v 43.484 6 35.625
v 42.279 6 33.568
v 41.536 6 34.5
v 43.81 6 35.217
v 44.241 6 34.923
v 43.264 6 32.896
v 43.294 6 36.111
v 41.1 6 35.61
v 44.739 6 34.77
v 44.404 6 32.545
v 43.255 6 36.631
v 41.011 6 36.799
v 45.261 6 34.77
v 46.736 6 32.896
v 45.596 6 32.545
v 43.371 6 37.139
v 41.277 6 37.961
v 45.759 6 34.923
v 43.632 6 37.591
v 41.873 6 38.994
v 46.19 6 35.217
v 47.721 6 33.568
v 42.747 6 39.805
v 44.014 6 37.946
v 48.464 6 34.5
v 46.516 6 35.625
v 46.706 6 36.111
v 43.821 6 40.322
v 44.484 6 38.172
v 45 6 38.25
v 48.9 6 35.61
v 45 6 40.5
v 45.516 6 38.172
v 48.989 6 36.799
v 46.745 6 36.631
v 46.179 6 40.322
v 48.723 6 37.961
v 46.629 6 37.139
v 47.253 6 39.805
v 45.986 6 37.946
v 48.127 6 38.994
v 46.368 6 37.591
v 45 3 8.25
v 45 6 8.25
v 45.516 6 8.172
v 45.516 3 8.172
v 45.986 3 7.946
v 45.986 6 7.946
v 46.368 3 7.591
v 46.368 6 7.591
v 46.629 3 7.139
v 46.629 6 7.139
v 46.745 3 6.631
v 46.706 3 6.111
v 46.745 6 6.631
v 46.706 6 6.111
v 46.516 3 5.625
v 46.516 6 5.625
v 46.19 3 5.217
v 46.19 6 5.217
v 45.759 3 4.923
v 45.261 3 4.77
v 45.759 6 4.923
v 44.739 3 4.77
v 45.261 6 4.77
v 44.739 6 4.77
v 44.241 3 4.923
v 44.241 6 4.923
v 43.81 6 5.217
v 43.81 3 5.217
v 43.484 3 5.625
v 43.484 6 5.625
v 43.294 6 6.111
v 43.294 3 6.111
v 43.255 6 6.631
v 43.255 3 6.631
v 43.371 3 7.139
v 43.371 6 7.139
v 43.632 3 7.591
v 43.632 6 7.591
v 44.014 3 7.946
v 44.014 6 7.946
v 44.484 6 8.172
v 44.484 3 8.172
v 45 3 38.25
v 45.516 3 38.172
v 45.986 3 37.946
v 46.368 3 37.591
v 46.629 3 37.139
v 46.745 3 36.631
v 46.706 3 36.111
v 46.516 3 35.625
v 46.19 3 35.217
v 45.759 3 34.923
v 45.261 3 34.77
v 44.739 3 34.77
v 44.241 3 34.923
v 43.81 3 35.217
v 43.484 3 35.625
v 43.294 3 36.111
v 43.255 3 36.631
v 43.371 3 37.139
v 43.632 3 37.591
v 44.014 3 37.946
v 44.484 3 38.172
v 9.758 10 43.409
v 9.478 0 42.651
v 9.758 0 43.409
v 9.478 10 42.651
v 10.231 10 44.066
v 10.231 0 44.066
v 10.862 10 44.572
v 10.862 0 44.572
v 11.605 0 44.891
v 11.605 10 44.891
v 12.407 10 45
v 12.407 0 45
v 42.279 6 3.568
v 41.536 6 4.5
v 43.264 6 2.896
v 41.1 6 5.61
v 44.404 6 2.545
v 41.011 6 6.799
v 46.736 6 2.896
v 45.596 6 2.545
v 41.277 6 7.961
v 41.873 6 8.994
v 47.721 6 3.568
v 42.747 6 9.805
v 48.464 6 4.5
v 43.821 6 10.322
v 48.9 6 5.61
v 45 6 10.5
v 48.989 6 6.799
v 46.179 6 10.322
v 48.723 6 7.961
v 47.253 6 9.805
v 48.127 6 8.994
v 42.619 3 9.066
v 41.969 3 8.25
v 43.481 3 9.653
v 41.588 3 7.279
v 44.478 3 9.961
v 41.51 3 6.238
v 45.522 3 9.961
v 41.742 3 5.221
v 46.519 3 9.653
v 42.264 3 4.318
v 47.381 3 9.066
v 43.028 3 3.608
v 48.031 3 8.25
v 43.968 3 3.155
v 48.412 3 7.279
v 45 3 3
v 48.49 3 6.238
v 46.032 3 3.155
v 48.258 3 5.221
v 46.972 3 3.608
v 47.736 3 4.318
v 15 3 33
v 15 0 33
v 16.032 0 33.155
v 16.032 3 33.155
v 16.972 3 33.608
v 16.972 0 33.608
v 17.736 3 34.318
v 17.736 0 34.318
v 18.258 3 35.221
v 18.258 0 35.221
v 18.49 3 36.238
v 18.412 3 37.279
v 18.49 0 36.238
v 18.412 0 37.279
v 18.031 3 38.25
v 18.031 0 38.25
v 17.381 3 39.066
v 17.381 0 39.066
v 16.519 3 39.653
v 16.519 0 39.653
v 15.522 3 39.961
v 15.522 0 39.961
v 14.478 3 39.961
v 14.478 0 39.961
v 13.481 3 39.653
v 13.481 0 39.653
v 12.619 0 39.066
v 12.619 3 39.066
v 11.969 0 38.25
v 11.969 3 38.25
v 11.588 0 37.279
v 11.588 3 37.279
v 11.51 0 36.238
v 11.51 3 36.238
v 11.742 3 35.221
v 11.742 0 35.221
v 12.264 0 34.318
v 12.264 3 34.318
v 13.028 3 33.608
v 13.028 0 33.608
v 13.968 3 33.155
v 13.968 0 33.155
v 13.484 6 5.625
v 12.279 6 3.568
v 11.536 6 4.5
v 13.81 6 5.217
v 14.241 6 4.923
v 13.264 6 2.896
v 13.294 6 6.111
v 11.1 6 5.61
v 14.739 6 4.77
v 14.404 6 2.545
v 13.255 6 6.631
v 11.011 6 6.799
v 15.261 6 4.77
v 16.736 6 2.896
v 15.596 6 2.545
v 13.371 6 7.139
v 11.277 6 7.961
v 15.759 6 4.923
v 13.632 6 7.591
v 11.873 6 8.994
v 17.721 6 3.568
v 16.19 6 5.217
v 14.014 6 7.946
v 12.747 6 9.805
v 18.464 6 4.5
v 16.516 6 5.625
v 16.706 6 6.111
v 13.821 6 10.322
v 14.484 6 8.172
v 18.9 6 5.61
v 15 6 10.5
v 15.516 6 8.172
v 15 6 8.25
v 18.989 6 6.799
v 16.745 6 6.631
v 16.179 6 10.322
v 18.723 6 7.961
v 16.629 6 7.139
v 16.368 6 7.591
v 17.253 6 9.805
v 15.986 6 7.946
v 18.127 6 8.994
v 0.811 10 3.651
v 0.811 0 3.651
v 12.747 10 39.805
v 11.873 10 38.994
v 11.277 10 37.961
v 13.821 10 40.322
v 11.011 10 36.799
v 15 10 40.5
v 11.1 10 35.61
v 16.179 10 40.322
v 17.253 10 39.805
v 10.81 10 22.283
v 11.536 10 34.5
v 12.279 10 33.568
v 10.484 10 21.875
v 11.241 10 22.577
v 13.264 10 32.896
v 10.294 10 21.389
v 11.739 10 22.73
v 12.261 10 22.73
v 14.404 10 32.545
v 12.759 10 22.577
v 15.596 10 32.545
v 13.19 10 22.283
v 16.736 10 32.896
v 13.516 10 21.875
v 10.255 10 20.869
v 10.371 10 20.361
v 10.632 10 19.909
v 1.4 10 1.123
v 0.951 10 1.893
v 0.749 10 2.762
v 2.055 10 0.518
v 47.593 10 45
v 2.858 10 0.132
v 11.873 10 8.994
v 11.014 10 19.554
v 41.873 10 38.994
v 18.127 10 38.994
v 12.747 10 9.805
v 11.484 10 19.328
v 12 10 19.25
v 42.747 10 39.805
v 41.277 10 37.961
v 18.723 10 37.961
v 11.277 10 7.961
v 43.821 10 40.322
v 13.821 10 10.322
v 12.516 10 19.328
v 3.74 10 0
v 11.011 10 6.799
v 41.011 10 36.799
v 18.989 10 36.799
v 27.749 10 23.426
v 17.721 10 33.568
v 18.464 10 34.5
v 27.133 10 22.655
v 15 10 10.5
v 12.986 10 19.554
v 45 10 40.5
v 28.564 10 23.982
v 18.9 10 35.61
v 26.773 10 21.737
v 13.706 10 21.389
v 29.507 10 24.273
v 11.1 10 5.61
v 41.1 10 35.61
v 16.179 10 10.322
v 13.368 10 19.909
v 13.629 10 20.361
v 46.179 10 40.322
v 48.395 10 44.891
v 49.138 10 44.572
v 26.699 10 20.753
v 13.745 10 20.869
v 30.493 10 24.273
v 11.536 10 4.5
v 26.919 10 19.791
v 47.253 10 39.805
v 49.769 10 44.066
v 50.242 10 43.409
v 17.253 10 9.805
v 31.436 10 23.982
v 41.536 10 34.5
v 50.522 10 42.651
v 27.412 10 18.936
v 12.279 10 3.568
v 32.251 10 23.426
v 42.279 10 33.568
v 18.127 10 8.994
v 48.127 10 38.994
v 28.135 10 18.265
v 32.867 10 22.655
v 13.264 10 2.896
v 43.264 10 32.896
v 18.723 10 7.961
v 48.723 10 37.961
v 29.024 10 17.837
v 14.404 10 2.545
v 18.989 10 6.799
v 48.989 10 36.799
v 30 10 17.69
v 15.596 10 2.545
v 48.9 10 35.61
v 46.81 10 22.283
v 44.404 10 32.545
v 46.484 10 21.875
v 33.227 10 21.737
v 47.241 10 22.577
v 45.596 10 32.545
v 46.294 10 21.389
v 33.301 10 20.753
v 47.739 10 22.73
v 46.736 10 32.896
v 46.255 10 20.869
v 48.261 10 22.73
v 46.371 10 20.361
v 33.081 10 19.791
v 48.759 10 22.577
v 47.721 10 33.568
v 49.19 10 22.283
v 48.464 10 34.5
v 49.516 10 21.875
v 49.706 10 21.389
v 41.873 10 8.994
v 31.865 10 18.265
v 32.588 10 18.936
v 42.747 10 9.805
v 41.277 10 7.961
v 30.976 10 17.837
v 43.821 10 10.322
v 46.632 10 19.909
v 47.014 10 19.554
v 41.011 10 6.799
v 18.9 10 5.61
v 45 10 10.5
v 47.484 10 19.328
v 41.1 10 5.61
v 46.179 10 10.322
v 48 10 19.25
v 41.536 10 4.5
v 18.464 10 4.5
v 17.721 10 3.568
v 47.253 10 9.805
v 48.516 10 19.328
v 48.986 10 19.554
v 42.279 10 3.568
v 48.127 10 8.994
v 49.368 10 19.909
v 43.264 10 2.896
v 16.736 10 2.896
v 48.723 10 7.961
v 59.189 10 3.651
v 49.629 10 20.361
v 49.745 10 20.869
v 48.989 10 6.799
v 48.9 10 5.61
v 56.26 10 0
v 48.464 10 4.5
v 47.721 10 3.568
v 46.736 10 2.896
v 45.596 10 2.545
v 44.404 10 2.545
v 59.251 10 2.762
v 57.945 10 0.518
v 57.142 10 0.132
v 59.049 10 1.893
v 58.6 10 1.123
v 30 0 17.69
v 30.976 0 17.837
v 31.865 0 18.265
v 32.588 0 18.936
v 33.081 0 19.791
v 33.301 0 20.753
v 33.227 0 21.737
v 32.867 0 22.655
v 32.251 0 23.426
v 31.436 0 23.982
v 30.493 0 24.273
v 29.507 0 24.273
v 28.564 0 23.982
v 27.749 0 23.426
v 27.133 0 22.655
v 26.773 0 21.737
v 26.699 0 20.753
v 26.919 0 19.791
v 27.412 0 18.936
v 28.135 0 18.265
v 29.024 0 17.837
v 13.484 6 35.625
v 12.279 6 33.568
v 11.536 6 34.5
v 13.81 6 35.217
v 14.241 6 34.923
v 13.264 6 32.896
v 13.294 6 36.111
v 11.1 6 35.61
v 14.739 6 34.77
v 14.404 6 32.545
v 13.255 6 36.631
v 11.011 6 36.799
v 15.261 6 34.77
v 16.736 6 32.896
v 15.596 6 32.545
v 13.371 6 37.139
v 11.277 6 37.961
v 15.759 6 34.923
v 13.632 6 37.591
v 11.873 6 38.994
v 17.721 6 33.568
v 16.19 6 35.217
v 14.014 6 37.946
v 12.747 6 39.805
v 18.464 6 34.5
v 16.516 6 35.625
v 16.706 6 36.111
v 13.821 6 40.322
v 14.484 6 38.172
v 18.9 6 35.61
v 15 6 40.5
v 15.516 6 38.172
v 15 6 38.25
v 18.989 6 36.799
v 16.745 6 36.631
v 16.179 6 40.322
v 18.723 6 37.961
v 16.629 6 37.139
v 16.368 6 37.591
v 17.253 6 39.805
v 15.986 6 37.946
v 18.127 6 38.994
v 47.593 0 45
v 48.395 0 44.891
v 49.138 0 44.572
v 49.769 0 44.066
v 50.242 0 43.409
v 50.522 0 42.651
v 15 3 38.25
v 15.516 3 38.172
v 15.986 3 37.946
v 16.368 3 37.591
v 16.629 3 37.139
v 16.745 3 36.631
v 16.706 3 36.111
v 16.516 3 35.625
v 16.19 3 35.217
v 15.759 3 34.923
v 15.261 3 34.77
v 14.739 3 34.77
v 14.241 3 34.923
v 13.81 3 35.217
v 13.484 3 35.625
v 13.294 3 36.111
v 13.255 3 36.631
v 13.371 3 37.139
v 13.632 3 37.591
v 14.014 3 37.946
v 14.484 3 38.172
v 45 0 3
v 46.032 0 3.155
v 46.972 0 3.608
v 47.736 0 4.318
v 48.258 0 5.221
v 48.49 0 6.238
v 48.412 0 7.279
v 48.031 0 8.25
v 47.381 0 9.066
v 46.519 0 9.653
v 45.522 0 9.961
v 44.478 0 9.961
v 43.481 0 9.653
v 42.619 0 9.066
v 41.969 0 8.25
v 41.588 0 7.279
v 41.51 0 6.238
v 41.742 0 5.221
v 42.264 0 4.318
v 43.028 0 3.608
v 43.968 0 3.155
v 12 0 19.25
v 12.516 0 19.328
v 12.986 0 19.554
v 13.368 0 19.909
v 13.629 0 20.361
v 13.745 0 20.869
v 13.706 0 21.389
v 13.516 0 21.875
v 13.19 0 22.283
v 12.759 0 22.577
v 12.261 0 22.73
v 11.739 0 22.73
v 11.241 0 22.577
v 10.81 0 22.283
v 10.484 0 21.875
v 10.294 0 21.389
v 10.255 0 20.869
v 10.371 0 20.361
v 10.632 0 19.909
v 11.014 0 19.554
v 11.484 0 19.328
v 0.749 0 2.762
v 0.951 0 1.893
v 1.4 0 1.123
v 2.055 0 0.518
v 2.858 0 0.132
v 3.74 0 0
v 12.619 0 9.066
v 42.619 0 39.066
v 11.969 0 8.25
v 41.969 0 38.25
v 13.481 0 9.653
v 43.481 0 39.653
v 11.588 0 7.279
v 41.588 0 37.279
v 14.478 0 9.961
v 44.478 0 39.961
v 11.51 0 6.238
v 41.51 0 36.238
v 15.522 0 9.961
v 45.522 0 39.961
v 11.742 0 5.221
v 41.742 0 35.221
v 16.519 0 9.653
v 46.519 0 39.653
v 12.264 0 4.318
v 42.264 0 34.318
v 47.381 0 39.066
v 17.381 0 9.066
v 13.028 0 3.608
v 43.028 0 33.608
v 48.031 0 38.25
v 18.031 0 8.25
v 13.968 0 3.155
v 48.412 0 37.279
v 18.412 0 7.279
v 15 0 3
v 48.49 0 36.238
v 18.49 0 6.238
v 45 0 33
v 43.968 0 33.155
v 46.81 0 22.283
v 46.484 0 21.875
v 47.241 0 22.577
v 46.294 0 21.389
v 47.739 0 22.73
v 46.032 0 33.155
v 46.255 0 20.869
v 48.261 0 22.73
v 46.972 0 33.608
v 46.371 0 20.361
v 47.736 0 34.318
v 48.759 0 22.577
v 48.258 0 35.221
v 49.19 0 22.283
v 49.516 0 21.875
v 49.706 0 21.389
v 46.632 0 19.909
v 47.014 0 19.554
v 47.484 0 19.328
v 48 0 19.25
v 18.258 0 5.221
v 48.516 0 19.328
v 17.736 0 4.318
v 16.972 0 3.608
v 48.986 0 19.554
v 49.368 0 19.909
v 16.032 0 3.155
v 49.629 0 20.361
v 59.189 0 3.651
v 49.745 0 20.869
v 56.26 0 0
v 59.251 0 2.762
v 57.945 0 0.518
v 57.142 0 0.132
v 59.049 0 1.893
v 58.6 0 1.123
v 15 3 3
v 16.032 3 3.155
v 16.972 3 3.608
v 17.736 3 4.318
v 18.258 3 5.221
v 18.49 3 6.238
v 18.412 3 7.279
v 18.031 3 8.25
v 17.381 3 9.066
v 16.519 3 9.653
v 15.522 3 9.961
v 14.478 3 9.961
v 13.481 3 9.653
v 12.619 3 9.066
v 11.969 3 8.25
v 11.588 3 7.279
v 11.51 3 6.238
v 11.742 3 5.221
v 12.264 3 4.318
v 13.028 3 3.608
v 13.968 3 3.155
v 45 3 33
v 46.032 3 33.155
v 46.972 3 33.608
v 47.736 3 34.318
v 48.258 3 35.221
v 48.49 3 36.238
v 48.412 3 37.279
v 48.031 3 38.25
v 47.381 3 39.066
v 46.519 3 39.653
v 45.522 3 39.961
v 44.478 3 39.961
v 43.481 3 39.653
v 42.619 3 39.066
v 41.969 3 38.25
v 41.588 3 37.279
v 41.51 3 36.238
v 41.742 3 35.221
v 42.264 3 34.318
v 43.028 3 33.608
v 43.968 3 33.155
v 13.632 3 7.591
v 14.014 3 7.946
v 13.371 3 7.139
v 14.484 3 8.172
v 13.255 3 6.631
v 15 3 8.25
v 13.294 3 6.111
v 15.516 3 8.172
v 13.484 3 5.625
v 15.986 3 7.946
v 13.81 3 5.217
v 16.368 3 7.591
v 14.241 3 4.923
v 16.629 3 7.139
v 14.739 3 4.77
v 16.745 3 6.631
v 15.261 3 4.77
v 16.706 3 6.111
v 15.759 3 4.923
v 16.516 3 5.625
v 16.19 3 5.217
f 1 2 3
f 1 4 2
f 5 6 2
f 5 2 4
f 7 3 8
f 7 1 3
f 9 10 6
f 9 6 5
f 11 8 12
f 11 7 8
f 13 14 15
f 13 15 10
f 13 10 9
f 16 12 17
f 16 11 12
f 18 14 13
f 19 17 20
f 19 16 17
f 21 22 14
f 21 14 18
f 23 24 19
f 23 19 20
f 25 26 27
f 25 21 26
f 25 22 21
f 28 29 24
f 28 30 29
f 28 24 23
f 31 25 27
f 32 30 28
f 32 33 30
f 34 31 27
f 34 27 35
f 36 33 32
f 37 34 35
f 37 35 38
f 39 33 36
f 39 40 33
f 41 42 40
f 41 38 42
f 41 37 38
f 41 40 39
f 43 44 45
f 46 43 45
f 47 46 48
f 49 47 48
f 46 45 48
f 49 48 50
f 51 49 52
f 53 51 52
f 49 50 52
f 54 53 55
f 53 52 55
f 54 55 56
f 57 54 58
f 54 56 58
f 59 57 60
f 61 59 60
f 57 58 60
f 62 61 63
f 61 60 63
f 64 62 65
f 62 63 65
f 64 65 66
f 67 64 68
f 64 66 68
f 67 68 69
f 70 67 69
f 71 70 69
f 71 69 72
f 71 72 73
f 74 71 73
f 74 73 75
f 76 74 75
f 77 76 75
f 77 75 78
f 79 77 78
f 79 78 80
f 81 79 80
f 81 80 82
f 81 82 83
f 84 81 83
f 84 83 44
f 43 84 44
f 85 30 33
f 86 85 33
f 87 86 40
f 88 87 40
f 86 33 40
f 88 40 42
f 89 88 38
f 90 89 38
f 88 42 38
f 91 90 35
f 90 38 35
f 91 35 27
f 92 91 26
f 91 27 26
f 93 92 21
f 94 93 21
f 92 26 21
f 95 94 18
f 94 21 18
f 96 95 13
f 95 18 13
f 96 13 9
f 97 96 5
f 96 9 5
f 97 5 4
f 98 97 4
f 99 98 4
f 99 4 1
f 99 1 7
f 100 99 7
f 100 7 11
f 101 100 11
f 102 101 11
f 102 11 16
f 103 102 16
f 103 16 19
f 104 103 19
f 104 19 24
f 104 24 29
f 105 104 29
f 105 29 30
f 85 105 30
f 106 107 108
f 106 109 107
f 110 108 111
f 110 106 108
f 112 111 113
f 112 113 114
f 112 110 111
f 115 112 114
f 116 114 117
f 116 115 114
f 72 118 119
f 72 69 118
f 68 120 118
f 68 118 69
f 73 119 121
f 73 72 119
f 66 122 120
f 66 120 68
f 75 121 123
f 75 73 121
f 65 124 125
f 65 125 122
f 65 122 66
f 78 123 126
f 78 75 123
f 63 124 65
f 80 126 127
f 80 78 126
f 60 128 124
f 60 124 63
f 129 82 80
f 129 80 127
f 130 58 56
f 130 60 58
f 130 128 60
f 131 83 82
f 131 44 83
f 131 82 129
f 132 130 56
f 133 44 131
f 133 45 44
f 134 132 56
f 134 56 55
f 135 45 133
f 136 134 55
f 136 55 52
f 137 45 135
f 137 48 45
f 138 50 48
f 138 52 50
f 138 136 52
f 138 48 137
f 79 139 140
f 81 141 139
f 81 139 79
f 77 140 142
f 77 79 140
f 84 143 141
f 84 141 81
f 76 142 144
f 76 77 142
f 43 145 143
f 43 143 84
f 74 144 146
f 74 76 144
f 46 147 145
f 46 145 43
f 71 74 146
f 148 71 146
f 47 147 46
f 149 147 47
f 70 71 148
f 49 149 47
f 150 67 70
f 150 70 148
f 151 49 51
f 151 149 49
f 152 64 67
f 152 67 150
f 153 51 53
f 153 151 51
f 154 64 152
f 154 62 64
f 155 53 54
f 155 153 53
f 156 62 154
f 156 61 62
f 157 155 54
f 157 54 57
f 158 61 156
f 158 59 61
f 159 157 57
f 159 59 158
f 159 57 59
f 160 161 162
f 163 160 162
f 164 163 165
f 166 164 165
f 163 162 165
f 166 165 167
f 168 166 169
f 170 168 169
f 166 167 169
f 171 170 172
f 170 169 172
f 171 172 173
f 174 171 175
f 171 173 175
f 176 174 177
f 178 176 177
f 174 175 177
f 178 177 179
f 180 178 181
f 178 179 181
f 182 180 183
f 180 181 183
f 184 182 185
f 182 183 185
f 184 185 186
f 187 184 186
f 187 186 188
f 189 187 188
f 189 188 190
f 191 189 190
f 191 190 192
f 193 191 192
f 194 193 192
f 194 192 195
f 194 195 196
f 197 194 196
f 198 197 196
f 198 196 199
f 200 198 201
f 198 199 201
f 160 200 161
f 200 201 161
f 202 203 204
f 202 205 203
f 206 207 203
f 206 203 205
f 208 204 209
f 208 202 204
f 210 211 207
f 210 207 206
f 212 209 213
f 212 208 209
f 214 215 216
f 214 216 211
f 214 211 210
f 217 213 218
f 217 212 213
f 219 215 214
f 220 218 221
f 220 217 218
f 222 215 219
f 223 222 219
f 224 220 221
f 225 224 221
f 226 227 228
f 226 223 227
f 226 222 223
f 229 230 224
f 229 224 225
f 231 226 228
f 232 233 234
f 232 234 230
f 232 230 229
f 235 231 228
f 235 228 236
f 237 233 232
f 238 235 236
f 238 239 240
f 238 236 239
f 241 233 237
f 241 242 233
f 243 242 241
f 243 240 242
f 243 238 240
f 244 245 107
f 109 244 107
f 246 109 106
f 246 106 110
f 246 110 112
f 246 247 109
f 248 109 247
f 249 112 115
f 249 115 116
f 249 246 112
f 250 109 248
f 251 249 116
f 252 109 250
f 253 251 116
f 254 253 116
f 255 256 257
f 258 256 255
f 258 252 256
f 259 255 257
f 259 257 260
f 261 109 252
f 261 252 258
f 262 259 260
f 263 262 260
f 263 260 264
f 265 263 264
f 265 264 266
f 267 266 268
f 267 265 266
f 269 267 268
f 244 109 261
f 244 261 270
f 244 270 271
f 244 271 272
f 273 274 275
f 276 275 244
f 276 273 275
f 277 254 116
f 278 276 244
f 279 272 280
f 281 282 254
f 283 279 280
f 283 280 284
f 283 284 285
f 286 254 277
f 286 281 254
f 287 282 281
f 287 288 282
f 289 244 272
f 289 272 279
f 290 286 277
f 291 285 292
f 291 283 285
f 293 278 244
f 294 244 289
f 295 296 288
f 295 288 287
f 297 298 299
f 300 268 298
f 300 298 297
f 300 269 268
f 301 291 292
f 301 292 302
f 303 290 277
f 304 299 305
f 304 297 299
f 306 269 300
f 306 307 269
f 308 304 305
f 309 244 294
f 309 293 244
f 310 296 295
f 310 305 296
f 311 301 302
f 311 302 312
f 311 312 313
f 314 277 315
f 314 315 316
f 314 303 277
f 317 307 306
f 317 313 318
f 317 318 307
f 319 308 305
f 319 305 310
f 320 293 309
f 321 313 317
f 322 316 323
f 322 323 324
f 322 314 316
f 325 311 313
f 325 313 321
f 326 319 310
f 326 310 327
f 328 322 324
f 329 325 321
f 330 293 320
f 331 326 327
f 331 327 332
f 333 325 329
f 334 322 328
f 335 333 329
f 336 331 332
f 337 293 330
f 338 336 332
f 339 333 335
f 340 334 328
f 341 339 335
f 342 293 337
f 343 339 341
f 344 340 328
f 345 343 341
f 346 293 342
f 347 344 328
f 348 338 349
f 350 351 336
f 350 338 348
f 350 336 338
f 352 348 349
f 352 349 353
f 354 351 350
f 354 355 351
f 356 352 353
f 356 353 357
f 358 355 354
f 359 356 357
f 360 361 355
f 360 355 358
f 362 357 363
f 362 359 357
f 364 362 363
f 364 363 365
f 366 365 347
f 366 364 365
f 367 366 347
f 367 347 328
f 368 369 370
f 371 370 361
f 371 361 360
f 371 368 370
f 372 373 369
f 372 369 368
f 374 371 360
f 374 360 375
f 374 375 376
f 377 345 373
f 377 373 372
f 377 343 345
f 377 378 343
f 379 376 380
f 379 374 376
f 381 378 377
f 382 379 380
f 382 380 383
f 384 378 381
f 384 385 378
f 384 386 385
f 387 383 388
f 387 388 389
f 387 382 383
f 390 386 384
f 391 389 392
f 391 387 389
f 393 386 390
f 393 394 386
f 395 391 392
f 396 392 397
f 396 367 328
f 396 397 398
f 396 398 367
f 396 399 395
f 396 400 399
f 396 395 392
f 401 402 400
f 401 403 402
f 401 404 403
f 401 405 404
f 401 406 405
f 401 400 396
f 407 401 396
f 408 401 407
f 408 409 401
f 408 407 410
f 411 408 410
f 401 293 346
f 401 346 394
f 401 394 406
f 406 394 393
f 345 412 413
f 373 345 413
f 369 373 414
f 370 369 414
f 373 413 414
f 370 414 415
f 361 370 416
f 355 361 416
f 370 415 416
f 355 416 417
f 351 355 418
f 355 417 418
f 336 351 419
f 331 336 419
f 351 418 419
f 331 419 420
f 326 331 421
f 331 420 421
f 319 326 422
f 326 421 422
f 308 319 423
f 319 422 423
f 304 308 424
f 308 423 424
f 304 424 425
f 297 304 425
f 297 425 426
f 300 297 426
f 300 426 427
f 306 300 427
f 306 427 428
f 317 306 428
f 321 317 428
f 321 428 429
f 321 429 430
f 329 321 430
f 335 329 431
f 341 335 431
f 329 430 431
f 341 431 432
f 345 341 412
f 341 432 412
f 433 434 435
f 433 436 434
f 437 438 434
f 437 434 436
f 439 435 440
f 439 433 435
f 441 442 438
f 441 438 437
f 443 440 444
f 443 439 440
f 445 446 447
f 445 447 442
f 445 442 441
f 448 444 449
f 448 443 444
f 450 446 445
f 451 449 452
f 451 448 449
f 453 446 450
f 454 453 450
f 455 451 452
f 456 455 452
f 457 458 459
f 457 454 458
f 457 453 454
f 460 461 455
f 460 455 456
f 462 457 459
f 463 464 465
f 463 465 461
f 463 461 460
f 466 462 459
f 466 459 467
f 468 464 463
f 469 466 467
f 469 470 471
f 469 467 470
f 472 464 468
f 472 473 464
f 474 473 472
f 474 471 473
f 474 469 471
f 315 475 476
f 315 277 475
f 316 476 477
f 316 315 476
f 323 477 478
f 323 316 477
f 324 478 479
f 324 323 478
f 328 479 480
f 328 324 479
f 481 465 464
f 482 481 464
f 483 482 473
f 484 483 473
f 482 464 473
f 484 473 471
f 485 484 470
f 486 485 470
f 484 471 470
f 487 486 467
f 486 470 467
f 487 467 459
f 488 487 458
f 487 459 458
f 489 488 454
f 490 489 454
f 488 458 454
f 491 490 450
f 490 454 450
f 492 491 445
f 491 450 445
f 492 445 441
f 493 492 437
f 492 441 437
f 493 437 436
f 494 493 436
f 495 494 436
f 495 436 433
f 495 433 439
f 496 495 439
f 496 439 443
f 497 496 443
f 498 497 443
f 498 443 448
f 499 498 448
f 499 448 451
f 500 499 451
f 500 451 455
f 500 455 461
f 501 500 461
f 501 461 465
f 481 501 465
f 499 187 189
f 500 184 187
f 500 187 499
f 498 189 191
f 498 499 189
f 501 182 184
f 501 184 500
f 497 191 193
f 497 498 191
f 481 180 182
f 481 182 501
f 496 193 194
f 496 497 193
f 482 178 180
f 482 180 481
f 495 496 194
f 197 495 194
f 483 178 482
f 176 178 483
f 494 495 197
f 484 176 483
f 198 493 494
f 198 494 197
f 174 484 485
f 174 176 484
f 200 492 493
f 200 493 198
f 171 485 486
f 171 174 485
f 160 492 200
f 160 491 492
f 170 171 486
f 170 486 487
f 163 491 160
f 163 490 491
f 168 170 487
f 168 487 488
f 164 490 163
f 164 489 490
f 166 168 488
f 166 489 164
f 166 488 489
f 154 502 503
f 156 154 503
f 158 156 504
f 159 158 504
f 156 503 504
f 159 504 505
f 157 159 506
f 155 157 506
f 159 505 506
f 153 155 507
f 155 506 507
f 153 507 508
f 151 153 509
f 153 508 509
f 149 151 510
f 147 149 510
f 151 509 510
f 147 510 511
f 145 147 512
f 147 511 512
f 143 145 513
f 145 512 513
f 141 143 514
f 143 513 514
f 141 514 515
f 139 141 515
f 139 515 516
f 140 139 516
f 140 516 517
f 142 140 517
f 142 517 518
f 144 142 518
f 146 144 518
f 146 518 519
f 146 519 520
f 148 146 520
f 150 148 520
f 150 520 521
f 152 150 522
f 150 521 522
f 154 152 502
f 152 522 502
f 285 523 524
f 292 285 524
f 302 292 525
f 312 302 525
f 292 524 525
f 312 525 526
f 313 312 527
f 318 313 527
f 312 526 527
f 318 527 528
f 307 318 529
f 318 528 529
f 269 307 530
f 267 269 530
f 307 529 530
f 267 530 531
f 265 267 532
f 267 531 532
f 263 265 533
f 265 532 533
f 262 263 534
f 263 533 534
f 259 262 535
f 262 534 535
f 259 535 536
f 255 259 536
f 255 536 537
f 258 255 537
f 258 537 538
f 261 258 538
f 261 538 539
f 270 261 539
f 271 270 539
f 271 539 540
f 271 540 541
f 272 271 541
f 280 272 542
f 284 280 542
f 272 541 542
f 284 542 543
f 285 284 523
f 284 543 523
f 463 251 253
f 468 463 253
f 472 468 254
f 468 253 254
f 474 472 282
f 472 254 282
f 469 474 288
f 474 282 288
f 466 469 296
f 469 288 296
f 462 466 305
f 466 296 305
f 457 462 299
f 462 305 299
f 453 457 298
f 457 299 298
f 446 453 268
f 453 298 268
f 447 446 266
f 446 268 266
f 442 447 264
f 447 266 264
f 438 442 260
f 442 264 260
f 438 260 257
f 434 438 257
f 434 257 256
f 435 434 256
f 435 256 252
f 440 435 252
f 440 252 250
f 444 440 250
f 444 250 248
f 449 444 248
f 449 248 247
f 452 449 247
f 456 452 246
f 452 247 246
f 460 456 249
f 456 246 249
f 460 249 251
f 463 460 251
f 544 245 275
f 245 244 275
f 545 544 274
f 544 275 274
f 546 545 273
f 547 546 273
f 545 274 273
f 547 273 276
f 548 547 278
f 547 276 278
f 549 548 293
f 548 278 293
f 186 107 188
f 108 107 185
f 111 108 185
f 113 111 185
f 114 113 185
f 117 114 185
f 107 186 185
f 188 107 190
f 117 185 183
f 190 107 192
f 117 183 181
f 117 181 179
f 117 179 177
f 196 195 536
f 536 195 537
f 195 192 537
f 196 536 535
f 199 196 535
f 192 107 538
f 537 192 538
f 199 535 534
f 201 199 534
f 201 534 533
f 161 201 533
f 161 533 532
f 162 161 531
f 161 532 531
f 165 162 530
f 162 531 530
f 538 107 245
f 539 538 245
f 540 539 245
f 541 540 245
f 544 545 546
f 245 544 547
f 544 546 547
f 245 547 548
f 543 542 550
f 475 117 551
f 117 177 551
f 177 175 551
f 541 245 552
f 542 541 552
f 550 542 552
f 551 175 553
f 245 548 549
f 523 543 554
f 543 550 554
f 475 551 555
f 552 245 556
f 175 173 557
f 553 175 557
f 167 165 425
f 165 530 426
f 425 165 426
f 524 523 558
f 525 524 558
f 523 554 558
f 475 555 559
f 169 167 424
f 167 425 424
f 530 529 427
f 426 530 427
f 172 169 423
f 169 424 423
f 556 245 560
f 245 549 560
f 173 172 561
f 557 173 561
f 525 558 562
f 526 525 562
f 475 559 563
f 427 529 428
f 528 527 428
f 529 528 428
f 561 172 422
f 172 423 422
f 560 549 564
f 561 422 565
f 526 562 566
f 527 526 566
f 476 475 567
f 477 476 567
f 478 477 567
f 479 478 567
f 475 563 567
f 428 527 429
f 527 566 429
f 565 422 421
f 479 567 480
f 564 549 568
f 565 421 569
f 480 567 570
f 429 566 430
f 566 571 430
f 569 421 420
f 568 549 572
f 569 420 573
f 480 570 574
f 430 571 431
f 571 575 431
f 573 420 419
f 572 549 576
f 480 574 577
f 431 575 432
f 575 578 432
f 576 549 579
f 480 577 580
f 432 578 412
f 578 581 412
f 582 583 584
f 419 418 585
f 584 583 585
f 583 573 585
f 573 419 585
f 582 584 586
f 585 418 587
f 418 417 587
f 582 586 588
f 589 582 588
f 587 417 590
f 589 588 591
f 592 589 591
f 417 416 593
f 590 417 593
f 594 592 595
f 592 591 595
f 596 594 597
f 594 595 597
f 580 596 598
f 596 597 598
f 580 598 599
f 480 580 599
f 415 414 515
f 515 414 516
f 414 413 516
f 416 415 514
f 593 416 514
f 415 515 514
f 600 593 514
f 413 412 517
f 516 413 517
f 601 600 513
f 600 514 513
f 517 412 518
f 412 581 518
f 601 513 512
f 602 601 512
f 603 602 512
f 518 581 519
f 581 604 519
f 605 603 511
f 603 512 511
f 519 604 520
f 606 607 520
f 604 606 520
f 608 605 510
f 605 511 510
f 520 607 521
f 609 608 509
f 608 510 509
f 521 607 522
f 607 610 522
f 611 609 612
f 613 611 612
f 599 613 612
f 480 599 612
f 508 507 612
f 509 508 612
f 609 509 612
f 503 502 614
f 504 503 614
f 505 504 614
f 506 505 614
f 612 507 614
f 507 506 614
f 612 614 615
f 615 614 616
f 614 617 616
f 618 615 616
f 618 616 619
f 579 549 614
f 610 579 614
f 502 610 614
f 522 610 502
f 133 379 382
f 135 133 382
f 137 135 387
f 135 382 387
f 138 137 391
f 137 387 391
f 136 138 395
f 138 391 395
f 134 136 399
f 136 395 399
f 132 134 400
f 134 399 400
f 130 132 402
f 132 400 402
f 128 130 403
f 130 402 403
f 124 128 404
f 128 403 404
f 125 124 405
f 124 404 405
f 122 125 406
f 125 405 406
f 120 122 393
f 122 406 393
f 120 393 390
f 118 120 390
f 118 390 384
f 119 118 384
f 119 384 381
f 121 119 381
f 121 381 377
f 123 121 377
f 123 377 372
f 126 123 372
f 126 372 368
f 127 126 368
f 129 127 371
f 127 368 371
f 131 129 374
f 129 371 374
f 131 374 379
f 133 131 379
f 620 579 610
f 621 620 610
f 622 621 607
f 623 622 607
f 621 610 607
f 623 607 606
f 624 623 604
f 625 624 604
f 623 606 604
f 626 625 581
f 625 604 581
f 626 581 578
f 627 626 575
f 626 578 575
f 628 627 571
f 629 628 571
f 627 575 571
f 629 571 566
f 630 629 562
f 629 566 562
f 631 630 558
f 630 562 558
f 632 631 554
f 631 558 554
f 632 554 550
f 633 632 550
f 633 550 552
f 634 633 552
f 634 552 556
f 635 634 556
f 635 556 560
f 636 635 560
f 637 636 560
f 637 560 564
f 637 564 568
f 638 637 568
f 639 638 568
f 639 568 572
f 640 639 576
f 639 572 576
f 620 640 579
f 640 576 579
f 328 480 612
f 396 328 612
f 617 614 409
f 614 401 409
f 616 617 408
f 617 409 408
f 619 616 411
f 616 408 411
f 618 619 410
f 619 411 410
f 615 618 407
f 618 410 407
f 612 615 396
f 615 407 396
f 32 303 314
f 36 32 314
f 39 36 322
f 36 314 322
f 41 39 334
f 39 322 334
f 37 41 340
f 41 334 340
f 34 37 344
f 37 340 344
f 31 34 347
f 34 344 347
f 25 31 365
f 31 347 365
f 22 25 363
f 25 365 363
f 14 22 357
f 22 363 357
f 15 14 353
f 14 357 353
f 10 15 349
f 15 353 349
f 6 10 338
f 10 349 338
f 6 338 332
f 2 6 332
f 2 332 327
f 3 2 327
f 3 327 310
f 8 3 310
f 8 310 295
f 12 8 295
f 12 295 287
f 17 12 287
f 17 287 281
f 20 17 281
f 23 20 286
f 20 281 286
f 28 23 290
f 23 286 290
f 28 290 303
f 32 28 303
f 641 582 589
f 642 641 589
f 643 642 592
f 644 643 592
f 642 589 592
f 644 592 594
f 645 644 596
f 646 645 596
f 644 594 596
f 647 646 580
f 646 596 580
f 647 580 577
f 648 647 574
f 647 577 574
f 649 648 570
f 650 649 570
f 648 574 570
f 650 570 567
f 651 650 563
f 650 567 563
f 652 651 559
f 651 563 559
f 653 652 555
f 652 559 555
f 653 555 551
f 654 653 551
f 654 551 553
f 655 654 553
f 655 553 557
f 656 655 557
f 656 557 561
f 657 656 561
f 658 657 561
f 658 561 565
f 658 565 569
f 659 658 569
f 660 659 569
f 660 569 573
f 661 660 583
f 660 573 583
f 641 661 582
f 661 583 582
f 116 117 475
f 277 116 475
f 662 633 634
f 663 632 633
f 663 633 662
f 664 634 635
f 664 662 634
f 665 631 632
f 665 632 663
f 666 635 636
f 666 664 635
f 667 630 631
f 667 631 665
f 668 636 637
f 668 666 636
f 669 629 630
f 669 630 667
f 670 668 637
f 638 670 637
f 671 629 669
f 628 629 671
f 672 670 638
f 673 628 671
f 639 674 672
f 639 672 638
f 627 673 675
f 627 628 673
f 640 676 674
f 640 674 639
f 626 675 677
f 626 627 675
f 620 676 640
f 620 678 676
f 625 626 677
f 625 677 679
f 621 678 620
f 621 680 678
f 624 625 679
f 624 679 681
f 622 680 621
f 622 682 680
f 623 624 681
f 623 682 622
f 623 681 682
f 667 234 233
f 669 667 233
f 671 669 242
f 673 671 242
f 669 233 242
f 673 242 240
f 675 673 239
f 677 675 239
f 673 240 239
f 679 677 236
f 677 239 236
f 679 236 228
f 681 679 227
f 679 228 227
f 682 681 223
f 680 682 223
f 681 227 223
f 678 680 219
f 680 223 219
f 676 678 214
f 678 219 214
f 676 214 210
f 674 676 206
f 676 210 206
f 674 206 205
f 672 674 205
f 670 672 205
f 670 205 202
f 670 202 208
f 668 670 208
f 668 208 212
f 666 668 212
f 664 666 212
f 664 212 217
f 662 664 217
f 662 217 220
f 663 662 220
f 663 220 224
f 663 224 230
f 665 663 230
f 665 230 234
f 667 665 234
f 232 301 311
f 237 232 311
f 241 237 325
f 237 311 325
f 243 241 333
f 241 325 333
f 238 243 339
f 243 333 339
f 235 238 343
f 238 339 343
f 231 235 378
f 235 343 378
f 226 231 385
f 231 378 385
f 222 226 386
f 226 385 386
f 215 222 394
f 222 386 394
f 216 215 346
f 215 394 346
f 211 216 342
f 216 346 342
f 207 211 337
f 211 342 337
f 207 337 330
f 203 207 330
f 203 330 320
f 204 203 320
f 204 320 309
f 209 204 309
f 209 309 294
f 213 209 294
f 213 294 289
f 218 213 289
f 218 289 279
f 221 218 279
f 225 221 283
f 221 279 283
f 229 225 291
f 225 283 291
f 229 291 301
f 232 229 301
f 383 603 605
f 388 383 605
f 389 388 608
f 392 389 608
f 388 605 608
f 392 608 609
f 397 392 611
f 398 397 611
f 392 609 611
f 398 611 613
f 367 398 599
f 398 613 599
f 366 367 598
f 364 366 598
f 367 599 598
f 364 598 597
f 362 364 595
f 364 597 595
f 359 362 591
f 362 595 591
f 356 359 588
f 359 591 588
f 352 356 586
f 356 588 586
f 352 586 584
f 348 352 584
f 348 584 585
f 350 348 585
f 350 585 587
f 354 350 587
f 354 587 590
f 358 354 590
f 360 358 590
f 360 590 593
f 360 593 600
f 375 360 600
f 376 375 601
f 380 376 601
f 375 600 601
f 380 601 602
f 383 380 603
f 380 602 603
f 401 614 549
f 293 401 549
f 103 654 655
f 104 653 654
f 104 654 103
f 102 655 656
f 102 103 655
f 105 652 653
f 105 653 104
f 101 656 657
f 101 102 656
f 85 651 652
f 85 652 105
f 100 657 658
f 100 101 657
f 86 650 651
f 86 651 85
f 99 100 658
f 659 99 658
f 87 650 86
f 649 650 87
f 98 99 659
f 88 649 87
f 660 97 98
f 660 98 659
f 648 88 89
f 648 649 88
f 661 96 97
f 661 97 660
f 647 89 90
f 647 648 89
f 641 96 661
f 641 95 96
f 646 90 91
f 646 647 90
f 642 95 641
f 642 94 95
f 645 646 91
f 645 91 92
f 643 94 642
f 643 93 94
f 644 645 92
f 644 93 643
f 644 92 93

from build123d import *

# Parameters (mm, degrees)
BOSS_EXTRUDE2_DEPTH = 10
SKETCH4_R           = 4
CUT_EXTRUDE1_DEPTH  = 4
FILLET1_R           = 3
SKETCH5_R           = 1.75
SKETCH5_R_2         = 3.31
CUT_EXTRUDE2_DEPTH  = 10
SKETCH7_R           = 1.75
CUT_EXTRUDE3_DEPTH  = 10
SKETCH8_R           = 3.5
CUT_EXTRUDE4_DEPTH  = 3


with BuildPart() as part:
    # Sketch1 → Boss-Extrude2 (new body)
    with BuildSketch(Plane(origin=(0, 0, 0), x_dir=(1, 0, 0), z_dir=(0, 1, 0))):
        Polygon((0, 0), (10, -45), (50, -45), (60, 0), align=None)
    extrude(amount=BOSS_EXTRUDE2_DEPTH)

    # Sketch4 → Cut-Extrude1 (cut)
    with BuildSketch(Plane(origin=(0, 10, 0), x_dir=(1, 0, 0), z_dir=(0, 1, 0))):
        with Locations(Location((15, -6.5, 0), (0, 0, 270))):
            Circle(SKETCH4_R)
        with Locations(Location((45, -6.5, 0), (0, 0, 270))):
            Circle(SKETCH4_R)
        with Locations(Location((45, -36.5, 0), (0, 0, 270))):
            Circle(SKETCH4_R)
        with Locations(Location((15, -36.5, 0), (0, 0, 270))):
            Circle(SKETCH4_R)
    extrude(amount=-CUT_EXTRUDE1_DEPTH, mode=Mode.SUBTRACT)

    # Fillet1
    fillet1_edges = [part.edges().sort_by_distance(p)[0] for p in [
        (60, 5, 0),
        (50, 5, 45),
        (10, 5, 45),
        (0, 5, 0),
    ]]
    fillet(fillet1_edges, radius=FILLET1_R)

    # Sketch5 → Cut-Extrude2 (cut)
    with BuildSketch(Plane.XZ):
        with Locations(Location((12, 21, 0), (0, 0, 270))):
            Circle(SKETCH5_R)
        with Locations(Location((48, 21, 0), (0, 0, 270))):
            Circle(SKETCH5_R)
        with Locations(Location((30, 21, 0), (0, 0, 270))):
            Circle(SKETCH5_R_2)
    extrude(amount=-CUT_EXTRUDE2_DEPTH, mode=Mode.SUBTRACT)

    # Sketch7 → Cut-Extrude3 (cut)
    with BuildSketch(Plane(origin=(0, 10, 0), x_dir=(1, 0, 0), z_dir=(0, 1, 0))):
        with Locations(Location((15, -6.5, 0), (0, 0, 270))):
            Circle(SKETCH7_R)
        with Locations(Location((45, -6.5, 0), (0, 0, 270))):
            Circle(SKETCH7_R)
        with Locations(Location((45, -36.5, 0), (0, 0, 270))):
            Circle(SKETCH7_R)
        with Locations(Location((15, -36.5, 0), (0, 0, 270))):
            Circle(SKETCH7_R)
    extrude(amount=-CUT_EXTRUDE3_DEPTH, mode=Mode.SUBTRACT)

    # Sketch8 → Cut-Extrude4 (cut)
    with BuildSketch(Plane.XZ):
        with Locations(Location((15, 36.5, 0), (0, 0, 270))):
            Circle(SKETCH8_R)
        with Locations(Location((45, 36.5, 0), (0, 0, 270))):
            Circle(SKETCH8_R)
        with Locations(Location((45, 6.5, 0), (0, 0, 270))):
            Circle(SKETCH8_R)
        with Locations(Location((15, 6.5, 0), (0, 0, 270))):
            Circle(SKETCH8_R)
    extrude(amount=-CUT_EXTRUDE4_DEPTH, mode=Mode.SUBTRACT)


solid = part.part
